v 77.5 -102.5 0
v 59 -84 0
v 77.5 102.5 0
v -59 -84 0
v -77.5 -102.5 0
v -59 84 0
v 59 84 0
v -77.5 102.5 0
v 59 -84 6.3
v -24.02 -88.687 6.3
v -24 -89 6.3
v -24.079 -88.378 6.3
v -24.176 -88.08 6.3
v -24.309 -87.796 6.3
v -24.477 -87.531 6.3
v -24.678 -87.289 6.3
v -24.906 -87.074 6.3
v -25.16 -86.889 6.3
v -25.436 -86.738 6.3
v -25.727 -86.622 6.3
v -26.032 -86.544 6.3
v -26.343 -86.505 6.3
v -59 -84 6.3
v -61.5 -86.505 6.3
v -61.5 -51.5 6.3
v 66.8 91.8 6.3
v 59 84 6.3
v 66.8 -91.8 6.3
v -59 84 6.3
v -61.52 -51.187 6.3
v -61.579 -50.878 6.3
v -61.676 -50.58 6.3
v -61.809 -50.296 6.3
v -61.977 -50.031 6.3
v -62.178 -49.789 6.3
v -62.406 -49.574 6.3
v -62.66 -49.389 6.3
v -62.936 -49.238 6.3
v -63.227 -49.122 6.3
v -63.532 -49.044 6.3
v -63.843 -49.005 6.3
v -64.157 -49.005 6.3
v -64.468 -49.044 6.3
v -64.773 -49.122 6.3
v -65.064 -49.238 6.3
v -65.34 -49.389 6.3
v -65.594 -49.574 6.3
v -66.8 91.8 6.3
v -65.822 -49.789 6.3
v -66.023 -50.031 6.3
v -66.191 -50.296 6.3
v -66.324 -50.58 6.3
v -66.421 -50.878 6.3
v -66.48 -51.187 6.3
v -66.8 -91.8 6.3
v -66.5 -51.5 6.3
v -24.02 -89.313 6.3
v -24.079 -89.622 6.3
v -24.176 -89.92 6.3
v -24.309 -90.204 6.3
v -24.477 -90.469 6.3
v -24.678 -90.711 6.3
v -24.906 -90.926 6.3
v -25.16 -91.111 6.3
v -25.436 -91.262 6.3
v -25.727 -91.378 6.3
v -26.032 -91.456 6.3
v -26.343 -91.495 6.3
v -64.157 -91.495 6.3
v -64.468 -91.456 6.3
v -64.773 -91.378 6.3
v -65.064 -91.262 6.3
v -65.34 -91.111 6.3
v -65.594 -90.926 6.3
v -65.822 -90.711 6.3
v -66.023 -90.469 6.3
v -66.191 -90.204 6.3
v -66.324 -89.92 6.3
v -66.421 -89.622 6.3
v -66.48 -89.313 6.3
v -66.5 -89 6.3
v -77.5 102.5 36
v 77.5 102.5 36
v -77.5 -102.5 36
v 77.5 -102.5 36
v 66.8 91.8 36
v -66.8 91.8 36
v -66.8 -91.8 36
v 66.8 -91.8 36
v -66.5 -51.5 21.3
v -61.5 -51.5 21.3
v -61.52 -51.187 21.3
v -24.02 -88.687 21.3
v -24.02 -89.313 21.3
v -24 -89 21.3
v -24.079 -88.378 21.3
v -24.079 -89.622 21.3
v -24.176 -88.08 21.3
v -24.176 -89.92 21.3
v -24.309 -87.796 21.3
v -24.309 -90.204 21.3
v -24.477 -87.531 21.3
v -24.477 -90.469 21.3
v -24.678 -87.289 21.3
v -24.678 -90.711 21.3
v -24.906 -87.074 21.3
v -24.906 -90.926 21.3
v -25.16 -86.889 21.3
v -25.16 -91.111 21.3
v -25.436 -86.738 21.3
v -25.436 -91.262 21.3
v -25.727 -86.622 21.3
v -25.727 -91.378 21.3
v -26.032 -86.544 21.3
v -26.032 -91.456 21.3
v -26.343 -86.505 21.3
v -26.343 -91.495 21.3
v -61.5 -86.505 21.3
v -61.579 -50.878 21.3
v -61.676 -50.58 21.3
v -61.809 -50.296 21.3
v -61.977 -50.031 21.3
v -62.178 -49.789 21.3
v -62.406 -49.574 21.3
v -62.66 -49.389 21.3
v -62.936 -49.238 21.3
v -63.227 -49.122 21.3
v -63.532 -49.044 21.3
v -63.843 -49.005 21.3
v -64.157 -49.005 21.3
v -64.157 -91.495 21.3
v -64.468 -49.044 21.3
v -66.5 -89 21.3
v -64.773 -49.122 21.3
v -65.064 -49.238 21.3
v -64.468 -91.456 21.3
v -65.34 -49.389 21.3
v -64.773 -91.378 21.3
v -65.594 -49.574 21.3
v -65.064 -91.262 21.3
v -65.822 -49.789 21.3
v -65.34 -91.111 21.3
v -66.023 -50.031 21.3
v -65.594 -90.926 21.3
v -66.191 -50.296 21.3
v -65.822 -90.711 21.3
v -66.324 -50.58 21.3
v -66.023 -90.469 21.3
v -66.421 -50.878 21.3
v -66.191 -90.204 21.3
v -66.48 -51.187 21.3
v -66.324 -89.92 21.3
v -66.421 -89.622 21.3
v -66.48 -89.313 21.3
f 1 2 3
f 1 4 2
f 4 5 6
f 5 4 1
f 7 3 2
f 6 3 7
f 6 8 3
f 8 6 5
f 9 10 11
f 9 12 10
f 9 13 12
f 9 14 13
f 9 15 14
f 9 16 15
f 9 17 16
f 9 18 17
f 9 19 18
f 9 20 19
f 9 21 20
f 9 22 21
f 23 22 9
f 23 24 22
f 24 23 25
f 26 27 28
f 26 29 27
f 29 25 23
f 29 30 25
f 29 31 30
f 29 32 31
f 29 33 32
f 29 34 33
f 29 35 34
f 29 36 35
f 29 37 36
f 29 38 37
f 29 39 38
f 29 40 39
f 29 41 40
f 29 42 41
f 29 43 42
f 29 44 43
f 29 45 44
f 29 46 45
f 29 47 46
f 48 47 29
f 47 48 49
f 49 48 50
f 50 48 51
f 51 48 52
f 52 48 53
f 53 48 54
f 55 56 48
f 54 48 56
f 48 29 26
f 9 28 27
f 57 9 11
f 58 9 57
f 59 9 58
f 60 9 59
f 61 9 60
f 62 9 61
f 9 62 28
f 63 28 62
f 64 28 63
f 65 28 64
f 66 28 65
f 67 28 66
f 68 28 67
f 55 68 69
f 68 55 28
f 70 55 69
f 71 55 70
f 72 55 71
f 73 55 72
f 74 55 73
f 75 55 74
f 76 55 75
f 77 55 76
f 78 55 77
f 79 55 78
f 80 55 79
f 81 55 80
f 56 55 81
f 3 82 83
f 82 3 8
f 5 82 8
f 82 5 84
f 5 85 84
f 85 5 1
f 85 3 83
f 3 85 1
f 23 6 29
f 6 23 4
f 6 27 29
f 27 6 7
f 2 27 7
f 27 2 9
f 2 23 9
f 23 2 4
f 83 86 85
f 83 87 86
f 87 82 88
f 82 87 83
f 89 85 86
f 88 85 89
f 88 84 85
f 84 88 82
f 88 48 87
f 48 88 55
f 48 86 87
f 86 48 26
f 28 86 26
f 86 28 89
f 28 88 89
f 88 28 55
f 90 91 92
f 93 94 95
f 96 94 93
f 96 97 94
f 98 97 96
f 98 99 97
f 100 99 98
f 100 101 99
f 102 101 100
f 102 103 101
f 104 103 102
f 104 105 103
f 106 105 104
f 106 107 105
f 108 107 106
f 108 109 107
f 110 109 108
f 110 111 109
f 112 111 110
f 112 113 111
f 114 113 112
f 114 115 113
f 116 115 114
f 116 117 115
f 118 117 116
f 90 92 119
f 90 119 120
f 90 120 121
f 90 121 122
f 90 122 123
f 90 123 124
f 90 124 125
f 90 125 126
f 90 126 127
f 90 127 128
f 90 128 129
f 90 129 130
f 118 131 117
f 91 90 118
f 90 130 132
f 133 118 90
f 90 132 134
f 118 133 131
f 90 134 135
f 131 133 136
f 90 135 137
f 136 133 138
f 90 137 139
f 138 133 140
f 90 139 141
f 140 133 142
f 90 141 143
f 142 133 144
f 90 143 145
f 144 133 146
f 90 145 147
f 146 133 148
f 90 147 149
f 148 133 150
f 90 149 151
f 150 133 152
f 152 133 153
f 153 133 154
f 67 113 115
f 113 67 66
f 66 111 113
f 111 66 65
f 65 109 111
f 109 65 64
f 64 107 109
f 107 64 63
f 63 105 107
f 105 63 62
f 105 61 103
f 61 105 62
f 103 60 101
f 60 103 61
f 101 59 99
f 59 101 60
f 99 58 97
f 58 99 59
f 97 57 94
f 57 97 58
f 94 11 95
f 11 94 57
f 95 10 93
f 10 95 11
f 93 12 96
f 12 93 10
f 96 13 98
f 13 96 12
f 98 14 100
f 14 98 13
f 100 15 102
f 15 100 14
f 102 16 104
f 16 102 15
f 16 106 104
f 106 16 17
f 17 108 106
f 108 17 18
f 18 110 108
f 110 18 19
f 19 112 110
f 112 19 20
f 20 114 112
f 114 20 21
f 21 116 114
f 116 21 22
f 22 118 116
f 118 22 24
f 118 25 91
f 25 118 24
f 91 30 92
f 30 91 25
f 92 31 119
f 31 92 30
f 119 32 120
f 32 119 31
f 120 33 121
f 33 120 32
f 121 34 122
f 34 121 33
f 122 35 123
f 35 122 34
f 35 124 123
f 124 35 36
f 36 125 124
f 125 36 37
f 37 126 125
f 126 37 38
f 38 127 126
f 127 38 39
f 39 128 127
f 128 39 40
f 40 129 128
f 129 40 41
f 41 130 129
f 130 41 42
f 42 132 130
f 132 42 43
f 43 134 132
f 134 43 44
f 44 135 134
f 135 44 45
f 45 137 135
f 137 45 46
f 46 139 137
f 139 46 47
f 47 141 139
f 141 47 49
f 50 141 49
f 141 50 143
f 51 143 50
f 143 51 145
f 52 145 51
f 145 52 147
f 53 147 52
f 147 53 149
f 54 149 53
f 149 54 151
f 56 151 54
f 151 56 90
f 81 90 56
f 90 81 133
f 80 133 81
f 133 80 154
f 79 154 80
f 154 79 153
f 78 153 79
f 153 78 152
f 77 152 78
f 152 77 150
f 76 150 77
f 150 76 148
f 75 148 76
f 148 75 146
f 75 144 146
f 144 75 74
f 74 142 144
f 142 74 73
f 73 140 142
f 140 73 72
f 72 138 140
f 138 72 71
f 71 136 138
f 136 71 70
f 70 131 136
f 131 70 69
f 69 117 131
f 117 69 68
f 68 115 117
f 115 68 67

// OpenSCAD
$fn=50;

ovDims=[40,40,15];
thick=5;

module corner(){
  translate([thick/2,thick/2,0]) linear_extrude(ovDims.z){
    hull() for (ix=[0,1]) translate([ix*(ovDims.x-thick/2),0]) circle(d=thick);
    hull() for (iy=[0,1]) translate([0,iy*(ovDims.y-thick/2)]) circle(d=thick);
  }
}
color("grey")
translate([-66.5,-91.5,6.3]) corner();
color("ivory") frame();

module frame(){
  ovDims=[155,205,36];
  wallThck=10.7;
  frntWdth=18.5;
  frntThck=6.3;
  
  linear_extrude(frntThck) difference(){
    square([ovDims.x,ovDims.y],true);
    square([ovDims.x-frntWdth*2,ovDims.y-frntWdth*2],true);
  }
  translate([0,0,frntThck]) linear_extrude(ovDims.z-frntThck) difference(){
    square([ovDims.x,ovDims.y],true);
    square([ovDims.x-wallThck*2,ovDims.y-wallThck*2],true);
  }
}
